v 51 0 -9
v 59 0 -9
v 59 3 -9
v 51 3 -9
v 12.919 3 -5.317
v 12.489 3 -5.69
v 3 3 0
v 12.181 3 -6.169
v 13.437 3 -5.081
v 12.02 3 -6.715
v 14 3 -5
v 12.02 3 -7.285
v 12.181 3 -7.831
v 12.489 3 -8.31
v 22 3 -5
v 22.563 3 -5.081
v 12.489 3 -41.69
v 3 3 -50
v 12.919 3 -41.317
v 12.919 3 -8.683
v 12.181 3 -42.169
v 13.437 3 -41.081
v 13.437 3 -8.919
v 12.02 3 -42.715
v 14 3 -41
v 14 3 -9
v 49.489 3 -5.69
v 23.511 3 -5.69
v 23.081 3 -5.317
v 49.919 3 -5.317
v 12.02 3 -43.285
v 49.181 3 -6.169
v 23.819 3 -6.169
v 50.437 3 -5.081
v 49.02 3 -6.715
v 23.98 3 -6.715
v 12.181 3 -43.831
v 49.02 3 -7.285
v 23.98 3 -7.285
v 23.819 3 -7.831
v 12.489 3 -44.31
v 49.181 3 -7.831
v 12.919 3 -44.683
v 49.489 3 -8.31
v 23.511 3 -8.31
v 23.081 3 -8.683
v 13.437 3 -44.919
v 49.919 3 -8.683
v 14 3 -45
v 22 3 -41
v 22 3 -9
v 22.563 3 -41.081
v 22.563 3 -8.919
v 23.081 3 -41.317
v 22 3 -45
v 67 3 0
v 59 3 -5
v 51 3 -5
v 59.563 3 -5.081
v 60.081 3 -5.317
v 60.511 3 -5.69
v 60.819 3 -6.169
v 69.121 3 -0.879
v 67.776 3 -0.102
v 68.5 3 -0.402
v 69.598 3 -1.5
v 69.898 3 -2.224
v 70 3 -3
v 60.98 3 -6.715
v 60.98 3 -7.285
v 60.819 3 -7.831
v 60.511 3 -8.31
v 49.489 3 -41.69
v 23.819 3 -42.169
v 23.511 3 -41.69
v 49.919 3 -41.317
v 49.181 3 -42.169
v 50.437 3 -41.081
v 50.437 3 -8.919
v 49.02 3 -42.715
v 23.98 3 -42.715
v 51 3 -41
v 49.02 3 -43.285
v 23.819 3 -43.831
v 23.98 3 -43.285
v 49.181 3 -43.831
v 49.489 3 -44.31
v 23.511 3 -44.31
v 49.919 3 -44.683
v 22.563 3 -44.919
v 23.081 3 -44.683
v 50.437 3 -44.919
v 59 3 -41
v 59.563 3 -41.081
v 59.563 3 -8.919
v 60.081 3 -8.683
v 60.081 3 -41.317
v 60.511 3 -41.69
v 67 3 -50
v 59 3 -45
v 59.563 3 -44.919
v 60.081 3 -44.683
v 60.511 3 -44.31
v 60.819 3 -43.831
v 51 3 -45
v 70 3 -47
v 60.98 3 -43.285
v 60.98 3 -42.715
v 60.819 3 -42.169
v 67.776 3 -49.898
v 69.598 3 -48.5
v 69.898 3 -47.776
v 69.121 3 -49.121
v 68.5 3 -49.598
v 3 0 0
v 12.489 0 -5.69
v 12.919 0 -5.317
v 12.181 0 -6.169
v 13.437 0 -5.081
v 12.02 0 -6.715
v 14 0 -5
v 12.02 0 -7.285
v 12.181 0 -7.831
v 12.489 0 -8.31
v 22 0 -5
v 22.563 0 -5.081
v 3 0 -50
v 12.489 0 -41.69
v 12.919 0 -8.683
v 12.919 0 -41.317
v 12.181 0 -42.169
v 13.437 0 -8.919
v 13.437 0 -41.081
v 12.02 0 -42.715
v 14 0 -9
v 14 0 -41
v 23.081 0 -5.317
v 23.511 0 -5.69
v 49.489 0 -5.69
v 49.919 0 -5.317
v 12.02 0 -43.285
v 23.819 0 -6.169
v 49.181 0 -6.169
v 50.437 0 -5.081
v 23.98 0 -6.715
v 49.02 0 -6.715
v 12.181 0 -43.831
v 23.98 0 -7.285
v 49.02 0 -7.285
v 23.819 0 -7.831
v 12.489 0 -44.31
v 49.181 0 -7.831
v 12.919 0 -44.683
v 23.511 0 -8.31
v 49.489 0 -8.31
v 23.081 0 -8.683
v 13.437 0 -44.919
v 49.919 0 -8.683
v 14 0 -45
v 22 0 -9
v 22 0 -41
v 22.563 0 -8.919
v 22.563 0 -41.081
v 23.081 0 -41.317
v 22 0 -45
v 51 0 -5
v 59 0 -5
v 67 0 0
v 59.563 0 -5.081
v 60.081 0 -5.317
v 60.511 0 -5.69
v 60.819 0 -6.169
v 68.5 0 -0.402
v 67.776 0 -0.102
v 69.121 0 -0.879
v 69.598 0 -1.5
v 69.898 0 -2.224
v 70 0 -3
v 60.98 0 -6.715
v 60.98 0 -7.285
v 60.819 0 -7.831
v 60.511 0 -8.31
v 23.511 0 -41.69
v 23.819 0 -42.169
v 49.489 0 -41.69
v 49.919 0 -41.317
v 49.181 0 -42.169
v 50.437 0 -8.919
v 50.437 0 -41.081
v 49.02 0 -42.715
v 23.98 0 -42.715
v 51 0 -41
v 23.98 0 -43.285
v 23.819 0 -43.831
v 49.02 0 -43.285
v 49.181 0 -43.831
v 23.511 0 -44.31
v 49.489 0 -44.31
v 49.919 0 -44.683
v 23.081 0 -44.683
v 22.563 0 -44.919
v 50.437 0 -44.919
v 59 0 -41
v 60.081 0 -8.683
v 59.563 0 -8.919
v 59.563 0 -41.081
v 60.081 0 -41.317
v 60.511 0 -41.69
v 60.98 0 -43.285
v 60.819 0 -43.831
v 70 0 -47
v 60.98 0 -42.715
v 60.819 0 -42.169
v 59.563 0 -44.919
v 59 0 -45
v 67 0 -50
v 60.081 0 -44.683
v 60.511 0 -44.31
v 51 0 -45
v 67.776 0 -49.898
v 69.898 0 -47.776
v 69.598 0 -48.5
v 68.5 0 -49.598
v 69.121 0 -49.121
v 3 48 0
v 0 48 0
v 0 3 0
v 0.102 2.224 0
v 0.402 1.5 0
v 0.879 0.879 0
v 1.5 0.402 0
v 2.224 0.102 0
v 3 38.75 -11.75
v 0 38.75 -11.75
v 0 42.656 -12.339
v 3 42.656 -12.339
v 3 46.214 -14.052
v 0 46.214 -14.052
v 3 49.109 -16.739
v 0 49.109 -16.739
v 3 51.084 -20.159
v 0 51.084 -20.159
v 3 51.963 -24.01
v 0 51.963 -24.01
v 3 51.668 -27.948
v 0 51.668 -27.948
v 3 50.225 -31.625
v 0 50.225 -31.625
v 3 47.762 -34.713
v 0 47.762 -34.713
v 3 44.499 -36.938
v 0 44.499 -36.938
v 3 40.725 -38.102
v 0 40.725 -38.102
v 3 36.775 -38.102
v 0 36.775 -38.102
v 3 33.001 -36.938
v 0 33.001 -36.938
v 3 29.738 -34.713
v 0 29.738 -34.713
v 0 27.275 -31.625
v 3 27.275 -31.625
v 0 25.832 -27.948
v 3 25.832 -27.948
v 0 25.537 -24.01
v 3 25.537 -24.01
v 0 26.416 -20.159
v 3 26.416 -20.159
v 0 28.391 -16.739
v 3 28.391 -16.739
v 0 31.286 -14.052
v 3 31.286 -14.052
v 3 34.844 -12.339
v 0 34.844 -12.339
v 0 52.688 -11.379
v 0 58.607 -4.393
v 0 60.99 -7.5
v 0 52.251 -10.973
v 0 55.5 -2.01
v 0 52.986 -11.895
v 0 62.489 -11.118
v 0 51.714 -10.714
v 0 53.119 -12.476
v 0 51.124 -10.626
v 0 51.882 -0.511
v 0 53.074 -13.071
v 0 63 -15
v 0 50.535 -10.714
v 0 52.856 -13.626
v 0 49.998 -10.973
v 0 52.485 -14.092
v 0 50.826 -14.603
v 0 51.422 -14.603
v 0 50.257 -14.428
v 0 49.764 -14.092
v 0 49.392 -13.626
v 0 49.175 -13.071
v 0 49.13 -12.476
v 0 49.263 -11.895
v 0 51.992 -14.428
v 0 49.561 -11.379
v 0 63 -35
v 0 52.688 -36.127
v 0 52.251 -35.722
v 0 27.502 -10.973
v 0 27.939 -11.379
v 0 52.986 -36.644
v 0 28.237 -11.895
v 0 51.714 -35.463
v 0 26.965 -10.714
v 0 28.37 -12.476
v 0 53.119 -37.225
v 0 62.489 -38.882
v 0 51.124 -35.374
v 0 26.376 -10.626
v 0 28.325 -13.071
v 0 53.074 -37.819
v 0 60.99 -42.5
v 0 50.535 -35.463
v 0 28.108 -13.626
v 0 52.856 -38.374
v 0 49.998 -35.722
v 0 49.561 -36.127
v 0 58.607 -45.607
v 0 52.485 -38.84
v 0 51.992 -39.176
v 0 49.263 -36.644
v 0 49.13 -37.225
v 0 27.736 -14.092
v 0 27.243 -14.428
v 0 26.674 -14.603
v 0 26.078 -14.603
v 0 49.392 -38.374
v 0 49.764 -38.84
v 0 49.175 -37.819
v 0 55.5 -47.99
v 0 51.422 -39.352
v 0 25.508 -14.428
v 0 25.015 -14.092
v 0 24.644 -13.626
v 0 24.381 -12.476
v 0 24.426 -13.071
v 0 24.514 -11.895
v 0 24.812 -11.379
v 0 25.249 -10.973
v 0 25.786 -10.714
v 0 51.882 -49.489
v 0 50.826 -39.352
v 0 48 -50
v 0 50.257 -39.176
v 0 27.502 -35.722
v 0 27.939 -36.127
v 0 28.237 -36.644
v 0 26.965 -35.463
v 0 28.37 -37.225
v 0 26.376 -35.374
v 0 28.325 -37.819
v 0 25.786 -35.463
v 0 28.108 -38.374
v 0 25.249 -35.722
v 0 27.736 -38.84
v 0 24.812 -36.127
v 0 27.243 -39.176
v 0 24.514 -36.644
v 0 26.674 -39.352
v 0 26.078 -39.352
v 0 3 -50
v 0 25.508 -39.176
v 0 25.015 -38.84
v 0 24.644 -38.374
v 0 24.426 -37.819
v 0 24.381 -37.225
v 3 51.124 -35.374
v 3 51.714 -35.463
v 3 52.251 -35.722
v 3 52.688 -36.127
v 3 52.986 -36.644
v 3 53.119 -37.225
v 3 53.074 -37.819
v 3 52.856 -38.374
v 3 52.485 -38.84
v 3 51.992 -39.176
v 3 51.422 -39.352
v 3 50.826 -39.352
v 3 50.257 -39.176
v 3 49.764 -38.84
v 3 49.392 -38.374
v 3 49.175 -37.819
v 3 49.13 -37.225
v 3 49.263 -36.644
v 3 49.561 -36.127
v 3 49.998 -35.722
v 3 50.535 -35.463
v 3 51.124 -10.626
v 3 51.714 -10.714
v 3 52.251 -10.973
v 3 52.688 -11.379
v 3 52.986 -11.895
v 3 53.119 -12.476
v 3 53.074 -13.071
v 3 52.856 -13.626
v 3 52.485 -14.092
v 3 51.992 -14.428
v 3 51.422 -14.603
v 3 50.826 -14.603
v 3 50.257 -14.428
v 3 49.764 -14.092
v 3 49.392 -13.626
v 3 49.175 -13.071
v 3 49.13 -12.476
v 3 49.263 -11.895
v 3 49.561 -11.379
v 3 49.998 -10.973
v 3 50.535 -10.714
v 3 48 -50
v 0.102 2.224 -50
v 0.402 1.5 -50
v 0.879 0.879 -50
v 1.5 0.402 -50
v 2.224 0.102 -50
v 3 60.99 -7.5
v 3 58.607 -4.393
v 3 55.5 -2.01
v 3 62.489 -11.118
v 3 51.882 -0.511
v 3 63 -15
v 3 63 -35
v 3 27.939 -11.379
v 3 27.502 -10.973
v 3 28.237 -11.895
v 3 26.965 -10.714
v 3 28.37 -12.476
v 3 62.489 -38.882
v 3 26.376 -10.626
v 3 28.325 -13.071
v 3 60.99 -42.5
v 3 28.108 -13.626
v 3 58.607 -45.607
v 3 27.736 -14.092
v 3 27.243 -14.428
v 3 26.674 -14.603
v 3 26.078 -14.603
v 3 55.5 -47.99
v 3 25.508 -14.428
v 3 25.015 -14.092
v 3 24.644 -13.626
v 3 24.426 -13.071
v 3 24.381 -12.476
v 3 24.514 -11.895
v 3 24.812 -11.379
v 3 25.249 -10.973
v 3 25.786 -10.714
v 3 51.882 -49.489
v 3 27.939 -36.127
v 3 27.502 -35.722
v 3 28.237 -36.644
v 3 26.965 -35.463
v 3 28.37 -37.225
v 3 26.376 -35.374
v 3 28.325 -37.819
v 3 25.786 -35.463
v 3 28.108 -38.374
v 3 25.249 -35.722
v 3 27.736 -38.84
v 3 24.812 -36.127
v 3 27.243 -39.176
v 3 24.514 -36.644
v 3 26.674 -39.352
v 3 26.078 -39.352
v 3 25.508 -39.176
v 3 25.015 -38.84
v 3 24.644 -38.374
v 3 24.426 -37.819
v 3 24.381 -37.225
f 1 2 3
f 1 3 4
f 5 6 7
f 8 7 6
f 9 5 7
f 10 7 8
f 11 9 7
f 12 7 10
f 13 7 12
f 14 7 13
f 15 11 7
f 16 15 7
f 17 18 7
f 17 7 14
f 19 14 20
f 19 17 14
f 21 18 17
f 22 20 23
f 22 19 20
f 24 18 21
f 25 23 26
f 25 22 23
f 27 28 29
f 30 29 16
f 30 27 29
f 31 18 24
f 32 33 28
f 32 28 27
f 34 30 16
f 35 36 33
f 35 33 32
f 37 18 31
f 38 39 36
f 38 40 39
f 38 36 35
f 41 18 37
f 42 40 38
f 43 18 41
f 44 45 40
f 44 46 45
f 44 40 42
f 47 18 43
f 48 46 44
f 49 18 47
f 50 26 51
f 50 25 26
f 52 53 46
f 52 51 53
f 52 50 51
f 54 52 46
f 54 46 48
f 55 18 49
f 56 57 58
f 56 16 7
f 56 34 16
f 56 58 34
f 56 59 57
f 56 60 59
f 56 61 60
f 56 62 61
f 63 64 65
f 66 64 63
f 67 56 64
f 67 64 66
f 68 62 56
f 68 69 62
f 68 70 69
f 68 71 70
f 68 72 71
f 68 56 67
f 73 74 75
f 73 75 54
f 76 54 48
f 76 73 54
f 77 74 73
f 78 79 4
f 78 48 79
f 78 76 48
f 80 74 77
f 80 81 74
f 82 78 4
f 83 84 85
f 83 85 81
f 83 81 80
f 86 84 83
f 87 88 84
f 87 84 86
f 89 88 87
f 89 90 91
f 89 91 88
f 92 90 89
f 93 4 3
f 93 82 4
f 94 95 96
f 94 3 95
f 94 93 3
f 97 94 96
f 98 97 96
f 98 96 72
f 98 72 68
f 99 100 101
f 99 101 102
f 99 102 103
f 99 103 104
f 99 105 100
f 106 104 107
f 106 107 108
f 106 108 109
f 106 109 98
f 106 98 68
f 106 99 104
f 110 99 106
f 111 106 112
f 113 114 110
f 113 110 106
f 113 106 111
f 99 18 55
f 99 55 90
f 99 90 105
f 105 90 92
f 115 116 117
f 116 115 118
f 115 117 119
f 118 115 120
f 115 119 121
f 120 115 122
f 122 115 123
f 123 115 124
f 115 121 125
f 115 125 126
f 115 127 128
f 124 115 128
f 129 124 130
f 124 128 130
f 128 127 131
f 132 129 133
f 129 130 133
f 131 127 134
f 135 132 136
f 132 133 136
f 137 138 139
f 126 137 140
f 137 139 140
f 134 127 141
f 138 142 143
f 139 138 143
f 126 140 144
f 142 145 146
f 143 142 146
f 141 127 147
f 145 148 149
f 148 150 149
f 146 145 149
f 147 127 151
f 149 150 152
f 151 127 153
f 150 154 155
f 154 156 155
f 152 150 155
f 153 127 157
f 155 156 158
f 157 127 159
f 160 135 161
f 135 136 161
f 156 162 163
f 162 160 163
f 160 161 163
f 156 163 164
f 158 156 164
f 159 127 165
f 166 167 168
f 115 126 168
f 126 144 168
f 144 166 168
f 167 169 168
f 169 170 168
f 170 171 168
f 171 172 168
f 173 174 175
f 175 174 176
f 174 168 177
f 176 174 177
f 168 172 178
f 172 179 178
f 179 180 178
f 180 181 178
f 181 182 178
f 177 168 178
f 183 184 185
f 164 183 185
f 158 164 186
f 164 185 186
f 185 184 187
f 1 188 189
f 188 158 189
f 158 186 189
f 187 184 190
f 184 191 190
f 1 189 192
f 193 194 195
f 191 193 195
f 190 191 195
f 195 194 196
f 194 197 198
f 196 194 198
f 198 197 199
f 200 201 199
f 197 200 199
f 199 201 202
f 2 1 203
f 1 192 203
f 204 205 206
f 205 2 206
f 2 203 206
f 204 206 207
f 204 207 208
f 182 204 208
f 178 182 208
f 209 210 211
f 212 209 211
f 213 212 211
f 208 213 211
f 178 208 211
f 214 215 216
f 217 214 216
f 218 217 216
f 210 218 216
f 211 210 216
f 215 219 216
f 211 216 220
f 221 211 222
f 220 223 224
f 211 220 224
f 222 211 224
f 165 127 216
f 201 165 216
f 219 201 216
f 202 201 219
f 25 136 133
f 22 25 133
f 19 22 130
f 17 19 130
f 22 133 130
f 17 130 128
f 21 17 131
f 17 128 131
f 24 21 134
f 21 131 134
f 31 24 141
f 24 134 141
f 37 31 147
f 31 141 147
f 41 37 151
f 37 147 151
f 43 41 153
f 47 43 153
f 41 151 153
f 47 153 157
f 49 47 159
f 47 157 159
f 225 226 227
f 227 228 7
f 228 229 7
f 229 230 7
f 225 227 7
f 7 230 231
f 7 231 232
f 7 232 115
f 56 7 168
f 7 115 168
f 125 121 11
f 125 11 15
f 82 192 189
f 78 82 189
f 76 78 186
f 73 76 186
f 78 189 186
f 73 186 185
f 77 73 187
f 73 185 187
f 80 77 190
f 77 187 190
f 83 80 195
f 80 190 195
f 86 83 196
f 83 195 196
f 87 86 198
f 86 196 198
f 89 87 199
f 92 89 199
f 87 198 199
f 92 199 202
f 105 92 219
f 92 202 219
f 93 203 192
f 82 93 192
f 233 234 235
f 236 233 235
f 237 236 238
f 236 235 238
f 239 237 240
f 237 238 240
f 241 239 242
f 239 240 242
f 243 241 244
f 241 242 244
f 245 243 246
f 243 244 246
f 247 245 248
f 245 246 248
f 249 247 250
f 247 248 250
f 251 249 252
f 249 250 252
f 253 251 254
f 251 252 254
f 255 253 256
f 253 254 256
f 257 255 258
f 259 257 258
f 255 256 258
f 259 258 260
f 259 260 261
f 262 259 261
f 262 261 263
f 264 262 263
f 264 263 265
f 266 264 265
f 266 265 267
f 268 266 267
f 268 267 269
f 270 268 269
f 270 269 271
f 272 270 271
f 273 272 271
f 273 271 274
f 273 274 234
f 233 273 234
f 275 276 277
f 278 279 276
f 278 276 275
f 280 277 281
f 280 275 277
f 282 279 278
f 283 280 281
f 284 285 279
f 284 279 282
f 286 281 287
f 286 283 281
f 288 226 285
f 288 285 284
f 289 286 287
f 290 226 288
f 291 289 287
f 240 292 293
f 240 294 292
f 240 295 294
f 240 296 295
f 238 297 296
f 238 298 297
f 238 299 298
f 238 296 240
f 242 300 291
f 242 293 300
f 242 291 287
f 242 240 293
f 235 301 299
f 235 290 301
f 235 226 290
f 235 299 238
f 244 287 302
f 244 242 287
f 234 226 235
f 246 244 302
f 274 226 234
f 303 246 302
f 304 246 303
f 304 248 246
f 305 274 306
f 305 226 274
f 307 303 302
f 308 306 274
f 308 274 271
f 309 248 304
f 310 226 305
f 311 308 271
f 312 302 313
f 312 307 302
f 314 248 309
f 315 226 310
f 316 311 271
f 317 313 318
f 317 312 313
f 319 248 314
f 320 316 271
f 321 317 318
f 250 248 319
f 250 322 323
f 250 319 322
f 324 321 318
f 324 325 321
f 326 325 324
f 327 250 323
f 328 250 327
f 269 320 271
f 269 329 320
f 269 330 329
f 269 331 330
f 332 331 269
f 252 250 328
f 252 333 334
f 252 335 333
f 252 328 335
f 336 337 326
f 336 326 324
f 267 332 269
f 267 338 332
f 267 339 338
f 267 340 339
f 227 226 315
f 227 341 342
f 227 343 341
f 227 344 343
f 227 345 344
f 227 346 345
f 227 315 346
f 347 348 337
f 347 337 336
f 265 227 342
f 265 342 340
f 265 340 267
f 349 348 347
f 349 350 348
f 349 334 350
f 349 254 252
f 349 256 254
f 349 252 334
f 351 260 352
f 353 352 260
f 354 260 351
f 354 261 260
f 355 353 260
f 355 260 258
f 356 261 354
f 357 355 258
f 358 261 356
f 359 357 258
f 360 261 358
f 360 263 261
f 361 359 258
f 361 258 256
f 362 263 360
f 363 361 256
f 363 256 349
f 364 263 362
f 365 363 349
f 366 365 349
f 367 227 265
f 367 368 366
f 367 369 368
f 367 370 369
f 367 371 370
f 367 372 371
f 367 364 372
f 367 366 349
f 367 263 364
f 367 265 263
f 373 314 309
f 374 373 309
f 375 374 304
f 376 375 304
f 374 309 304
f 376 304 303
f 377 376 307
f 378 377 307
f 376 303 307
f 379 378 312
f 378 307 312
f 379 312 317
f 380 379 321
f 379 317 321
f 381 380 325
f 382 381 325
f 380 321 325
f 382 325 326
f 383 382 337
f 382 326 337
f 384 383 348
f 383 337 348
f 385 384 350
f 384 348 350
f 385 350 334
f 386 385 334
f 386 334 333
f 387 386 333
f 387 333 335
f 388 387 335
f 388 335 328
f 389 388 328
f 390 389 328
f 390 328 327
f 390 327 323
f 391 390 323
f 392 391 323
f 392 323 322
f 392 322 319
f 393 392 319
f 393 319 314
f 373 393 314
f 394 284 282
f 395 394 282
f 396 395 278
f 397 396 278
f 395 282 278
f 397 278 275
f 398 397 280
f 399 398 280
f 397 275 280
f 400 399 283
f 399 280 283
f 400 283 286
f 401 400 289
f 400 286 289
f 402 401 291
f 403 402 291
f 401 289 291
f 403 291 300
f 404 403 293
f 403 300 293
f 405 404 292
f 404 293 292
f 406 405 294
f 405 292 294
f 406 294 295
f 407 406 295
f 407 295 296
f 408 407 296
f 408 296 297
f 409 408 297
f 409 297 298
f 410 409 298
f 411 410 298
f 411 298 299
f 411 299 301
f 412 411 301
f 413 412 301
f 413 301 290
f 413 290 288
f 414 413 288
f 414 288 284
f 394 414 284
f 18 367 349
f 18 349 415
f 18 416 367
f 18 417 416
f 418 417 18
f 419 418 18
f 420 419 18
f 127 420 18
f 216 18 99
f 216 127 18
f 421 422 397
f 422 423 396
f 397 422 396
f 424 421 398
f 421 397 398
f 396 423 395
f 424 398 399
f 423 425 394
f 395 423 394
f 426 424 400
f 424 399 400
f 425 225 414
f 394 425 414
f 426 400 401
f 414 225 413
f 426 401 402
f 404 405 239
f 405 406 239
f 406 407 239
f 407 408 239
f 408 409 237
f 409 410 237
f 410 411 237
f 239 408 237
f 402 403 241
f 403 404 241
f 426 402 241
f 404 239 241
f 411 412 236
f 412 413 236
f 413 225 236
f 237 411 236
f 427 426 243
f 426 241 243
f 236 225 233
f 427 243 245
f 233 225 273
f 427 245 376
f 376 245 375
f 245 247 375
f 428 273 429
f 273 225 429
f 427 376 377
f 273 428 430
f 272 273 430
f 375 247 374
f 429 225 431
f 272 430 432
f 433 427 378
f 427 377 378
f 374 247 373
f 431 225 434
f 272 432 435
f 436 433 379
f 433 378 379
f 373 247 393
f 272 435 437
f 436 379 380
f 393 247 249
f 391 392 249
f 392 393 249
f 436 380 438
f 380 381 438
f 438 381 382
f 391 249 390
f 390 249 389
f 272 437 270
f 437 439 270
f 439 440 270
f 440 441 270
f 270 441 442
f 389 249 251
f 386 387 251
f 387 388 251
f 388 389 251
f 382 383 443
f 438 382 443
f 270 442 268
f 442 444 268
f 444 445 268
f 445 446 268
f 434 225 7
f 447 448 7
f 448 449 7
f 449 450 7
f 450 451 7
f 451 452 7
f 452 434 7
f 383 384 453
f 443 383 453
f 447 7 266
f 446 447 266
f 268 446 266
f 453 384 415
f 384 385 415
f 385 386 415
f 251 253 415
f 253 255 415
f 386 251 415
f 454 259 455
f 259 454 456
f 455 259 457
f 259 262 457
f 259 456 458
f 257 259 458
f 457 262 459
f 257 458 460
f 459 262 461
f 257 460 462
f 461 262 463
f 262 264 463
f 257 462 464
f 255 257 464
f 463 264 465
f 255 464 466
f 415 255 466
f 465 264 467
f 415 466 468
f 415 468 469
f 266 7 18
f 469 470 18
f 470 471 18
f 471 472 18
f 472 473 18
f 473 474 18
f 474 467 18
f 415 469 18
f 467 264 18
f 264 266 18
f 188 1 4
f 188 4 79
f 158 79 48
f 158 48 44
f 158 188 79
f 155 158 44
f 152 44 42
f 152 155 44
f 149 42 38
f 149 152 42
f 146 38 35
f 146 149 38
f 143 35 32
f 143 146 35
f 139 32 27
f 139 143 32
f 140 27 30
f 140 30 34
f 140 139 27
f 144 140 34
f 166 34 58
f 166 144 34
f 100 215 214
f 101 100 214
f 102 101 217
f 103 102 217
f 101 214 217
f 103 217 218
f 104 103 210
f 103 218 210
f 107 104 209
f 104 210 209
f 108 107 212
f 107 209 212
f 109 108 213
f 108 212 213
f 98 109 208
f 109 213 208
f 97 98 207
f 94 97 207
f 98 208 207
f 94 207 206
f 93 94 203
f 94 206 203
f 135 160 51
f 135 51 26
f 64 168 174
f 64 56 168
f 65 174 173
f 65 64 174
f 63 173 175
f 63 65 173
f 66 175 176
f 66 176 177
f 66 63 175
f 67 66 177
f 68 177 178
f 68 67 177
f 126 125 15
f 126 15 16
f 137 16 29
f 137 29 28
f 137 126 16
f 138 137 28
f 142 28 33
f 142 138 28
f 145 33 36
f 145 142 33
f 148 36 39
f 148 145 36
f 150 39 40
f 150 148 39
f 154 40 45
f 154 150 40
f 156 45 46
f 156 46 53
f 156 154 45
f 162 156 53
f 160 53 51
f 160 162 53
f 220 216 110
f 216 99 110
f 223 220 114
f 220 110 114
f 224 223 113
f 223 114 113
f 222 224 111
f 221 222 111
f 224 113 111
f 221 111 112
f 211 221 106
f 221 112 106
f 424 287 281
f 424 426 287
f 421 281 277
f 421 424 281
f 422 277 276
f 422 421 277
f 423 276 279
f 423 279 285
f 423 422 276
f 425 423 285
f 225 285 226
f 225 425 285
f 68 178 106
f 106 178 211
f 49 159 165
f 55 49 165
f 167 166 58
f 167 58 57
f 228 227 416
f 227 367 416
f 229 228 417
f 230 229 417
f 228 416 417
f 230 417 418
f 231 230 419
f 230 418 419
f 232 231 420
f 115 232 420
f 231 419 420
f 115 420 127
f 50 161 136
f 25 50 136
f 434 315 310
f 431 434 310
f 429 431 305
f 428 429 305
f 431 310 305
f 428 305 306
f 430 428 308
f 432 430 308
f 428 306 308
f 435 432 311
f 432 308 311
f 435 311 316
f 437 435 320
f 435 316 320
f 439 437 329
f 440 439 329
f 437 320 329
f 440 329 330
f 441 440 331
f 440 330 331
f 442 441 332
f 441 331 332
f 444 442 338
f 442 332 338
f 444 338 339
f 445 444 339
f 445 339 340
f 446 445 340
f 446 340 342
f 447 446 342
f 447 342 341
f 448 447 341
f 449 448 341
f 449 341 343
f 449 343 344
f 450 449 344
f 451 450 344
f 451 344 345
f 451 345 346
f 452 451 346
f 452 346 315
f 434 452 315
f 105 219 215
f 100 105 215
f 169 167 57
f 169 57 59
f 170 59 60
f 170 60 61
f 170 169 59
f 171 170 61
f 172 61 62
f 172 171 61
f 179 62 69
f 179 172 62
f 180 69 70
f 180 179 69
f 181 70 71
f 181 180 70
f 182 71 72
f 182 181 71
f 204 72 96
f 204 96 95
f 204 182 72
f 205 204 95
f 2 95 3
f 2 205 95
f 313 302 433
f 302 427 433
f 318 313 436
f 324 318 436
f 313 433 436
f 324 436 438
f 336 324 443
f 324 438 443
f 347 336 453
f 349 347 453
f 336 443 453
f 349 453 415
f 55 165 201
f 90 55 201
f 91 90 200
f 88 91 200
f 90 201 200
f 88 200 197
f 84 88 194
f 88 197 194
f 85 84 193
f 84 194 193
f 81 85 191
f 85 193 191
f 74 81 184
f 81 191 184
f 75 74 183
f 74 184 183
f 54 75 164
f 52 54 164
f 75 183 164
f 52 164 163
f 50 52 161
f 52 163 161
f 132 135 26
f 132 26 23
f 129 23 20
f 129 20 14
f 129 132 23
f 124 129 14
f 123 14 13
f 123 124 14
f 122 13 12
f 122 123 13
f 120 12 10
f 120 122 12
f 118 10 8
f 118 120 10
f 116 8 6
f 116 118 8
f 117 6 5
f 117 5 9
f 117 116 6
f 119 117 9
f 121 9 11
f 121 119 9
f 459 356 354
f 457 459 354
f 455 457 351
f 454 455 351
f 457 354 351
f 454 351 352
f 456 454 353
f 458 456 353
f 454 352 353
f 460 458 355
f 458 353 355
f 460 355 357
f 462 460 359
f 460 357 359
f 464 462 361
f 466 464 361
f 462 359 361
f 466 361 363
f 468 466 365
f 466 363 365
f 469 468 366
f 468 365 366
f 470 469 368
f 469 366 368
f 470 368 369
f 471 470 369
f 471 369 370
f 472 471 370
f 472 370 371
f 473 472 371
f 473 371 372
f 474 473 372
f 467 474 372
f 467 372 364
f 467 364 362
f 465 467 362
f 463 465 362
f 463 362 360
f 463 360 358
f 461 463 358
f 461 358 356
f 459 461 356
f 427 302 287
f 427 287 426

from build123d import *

# Parameters (mm, degrees)
SKETCH1_W           = 70
SKETCH1_H           = 50
BOSS_EXTRUDE1_DEPTH = 3
SKETCH2_W           = 3
SKETCH2_H           = 50
BOSS_EXTRUDE2_DEPTH = 60
SKETCH3_R           = 13.25
SKETCH3_R_2         = 2
CUT_EXTRUDE1_DEPTH  = 60
FILLET1_R           = 15
FILLET2_R           = 3


with BuildPart() as part:
    # Sketch1 → Boss-Extrude1 (new body)
    with BuildSketch(Plane(origin=(0, 0, 0), x_dir=(1, 0, 0), z_dir=(0, 1, 0))):
        with Locations((35, 25)):
            Rectangle(SKETCH1_W, SKETCH1_H)
        with BuildLine():
            Line((14, 45), (22, 45))
            ThreePointArc((22, 45), (24, 43), (22, 41))
            Line((22, 41), (14, 41))
            ThreePointArc((14, 41), (12, 43), (14, 45))
        make_face(mode=Mode.SUBTRACT)
        with BuildLine():
            Line((51, 45), (59, 45))
            ThreePointArc((59, 45), (61, 43), (59, 41))
            Line((59, 41), (51, 41))
            ThreePointArc((51, 41), (49, 43), (51, 45))
        make_face(mode=Mode.SUBTRACT)
        with BuildLine():
            Line((51, 5), (59, 5))
            ThreePointArc((59, 5), (61, 7), (59, 9))
            Line((59, 9), (51, 9))
            ThreePointArc((51, 9), (49, 7), (51, 5))
        make_face(mode=Mode.SUBTRACT)
        with BuildLine():
            Line((14, 5), (22, 5))
            ThreePointArc((22, 5), (24, 7), (22, 9))
            Line((22, 9), (14, 9))
            ThreePointArc((14, 9), (12, 7), (14, 5))
        make_face(mode=Mode.SUBTRACT)
    extrude(amount=BOSS_EXTRUDE1_DEPTH)

    # Sketch2 → Boss-Extrude2 (add)
    with BuildSketch(Plane(origin=(0, 3, 0), x_dir=(1, 0, 0), z_dir=(0, 1, 0))):
        with Locations((1.5, 25)):
            Rectangle(SKETCH2_W, SKETCH2_H)
    extrude(amount=BOSS_EXTRUDE2_DEPTH)

    # Sketch3 → Cut-Extrude1 (cut)
    with BuildSketch(Plane.ZY):
        with Locations((-25, 38.75)):
            Circle(SKETCH3_R)
        with Locations((-12.625631329, 26.375631329)):
            Circle(SKETCH3_R_2)
        with Locations((-12.625631329, 51.124368671)):
            Circle(SKETCH3_R_2)
        with Locations((-37.374368671, 51.124368671)):
            Circle(SKETCH3_R_2)
        with Locations((-37.374368671, 26.375631329)):
            Circle(SKETCH3_R_2)
    extrude(amount=-CUT_EXTRUDE1_DEPTH, mode=Mode.SUBTRACT)

    # Fillet1
    fillet1_edges = [part.edges().sort_by_distance(p)[0] for p in [
        (1.5, 63, 0),
        (1.5, 63, -50),
    ]]
    fillet(fillet1_edges, radius=FILLET1_R)

    # Fillet2
    fillet2_edges = [part.edges().sort_by_distance(p)[0] for p in [
        (0, 0, -25),
        (70, 1.5, -50),
        (70, 1.5, 0),
    ]]
    fillet(fillet2_edges, radius=FILLET2_R)


solid = part.part
